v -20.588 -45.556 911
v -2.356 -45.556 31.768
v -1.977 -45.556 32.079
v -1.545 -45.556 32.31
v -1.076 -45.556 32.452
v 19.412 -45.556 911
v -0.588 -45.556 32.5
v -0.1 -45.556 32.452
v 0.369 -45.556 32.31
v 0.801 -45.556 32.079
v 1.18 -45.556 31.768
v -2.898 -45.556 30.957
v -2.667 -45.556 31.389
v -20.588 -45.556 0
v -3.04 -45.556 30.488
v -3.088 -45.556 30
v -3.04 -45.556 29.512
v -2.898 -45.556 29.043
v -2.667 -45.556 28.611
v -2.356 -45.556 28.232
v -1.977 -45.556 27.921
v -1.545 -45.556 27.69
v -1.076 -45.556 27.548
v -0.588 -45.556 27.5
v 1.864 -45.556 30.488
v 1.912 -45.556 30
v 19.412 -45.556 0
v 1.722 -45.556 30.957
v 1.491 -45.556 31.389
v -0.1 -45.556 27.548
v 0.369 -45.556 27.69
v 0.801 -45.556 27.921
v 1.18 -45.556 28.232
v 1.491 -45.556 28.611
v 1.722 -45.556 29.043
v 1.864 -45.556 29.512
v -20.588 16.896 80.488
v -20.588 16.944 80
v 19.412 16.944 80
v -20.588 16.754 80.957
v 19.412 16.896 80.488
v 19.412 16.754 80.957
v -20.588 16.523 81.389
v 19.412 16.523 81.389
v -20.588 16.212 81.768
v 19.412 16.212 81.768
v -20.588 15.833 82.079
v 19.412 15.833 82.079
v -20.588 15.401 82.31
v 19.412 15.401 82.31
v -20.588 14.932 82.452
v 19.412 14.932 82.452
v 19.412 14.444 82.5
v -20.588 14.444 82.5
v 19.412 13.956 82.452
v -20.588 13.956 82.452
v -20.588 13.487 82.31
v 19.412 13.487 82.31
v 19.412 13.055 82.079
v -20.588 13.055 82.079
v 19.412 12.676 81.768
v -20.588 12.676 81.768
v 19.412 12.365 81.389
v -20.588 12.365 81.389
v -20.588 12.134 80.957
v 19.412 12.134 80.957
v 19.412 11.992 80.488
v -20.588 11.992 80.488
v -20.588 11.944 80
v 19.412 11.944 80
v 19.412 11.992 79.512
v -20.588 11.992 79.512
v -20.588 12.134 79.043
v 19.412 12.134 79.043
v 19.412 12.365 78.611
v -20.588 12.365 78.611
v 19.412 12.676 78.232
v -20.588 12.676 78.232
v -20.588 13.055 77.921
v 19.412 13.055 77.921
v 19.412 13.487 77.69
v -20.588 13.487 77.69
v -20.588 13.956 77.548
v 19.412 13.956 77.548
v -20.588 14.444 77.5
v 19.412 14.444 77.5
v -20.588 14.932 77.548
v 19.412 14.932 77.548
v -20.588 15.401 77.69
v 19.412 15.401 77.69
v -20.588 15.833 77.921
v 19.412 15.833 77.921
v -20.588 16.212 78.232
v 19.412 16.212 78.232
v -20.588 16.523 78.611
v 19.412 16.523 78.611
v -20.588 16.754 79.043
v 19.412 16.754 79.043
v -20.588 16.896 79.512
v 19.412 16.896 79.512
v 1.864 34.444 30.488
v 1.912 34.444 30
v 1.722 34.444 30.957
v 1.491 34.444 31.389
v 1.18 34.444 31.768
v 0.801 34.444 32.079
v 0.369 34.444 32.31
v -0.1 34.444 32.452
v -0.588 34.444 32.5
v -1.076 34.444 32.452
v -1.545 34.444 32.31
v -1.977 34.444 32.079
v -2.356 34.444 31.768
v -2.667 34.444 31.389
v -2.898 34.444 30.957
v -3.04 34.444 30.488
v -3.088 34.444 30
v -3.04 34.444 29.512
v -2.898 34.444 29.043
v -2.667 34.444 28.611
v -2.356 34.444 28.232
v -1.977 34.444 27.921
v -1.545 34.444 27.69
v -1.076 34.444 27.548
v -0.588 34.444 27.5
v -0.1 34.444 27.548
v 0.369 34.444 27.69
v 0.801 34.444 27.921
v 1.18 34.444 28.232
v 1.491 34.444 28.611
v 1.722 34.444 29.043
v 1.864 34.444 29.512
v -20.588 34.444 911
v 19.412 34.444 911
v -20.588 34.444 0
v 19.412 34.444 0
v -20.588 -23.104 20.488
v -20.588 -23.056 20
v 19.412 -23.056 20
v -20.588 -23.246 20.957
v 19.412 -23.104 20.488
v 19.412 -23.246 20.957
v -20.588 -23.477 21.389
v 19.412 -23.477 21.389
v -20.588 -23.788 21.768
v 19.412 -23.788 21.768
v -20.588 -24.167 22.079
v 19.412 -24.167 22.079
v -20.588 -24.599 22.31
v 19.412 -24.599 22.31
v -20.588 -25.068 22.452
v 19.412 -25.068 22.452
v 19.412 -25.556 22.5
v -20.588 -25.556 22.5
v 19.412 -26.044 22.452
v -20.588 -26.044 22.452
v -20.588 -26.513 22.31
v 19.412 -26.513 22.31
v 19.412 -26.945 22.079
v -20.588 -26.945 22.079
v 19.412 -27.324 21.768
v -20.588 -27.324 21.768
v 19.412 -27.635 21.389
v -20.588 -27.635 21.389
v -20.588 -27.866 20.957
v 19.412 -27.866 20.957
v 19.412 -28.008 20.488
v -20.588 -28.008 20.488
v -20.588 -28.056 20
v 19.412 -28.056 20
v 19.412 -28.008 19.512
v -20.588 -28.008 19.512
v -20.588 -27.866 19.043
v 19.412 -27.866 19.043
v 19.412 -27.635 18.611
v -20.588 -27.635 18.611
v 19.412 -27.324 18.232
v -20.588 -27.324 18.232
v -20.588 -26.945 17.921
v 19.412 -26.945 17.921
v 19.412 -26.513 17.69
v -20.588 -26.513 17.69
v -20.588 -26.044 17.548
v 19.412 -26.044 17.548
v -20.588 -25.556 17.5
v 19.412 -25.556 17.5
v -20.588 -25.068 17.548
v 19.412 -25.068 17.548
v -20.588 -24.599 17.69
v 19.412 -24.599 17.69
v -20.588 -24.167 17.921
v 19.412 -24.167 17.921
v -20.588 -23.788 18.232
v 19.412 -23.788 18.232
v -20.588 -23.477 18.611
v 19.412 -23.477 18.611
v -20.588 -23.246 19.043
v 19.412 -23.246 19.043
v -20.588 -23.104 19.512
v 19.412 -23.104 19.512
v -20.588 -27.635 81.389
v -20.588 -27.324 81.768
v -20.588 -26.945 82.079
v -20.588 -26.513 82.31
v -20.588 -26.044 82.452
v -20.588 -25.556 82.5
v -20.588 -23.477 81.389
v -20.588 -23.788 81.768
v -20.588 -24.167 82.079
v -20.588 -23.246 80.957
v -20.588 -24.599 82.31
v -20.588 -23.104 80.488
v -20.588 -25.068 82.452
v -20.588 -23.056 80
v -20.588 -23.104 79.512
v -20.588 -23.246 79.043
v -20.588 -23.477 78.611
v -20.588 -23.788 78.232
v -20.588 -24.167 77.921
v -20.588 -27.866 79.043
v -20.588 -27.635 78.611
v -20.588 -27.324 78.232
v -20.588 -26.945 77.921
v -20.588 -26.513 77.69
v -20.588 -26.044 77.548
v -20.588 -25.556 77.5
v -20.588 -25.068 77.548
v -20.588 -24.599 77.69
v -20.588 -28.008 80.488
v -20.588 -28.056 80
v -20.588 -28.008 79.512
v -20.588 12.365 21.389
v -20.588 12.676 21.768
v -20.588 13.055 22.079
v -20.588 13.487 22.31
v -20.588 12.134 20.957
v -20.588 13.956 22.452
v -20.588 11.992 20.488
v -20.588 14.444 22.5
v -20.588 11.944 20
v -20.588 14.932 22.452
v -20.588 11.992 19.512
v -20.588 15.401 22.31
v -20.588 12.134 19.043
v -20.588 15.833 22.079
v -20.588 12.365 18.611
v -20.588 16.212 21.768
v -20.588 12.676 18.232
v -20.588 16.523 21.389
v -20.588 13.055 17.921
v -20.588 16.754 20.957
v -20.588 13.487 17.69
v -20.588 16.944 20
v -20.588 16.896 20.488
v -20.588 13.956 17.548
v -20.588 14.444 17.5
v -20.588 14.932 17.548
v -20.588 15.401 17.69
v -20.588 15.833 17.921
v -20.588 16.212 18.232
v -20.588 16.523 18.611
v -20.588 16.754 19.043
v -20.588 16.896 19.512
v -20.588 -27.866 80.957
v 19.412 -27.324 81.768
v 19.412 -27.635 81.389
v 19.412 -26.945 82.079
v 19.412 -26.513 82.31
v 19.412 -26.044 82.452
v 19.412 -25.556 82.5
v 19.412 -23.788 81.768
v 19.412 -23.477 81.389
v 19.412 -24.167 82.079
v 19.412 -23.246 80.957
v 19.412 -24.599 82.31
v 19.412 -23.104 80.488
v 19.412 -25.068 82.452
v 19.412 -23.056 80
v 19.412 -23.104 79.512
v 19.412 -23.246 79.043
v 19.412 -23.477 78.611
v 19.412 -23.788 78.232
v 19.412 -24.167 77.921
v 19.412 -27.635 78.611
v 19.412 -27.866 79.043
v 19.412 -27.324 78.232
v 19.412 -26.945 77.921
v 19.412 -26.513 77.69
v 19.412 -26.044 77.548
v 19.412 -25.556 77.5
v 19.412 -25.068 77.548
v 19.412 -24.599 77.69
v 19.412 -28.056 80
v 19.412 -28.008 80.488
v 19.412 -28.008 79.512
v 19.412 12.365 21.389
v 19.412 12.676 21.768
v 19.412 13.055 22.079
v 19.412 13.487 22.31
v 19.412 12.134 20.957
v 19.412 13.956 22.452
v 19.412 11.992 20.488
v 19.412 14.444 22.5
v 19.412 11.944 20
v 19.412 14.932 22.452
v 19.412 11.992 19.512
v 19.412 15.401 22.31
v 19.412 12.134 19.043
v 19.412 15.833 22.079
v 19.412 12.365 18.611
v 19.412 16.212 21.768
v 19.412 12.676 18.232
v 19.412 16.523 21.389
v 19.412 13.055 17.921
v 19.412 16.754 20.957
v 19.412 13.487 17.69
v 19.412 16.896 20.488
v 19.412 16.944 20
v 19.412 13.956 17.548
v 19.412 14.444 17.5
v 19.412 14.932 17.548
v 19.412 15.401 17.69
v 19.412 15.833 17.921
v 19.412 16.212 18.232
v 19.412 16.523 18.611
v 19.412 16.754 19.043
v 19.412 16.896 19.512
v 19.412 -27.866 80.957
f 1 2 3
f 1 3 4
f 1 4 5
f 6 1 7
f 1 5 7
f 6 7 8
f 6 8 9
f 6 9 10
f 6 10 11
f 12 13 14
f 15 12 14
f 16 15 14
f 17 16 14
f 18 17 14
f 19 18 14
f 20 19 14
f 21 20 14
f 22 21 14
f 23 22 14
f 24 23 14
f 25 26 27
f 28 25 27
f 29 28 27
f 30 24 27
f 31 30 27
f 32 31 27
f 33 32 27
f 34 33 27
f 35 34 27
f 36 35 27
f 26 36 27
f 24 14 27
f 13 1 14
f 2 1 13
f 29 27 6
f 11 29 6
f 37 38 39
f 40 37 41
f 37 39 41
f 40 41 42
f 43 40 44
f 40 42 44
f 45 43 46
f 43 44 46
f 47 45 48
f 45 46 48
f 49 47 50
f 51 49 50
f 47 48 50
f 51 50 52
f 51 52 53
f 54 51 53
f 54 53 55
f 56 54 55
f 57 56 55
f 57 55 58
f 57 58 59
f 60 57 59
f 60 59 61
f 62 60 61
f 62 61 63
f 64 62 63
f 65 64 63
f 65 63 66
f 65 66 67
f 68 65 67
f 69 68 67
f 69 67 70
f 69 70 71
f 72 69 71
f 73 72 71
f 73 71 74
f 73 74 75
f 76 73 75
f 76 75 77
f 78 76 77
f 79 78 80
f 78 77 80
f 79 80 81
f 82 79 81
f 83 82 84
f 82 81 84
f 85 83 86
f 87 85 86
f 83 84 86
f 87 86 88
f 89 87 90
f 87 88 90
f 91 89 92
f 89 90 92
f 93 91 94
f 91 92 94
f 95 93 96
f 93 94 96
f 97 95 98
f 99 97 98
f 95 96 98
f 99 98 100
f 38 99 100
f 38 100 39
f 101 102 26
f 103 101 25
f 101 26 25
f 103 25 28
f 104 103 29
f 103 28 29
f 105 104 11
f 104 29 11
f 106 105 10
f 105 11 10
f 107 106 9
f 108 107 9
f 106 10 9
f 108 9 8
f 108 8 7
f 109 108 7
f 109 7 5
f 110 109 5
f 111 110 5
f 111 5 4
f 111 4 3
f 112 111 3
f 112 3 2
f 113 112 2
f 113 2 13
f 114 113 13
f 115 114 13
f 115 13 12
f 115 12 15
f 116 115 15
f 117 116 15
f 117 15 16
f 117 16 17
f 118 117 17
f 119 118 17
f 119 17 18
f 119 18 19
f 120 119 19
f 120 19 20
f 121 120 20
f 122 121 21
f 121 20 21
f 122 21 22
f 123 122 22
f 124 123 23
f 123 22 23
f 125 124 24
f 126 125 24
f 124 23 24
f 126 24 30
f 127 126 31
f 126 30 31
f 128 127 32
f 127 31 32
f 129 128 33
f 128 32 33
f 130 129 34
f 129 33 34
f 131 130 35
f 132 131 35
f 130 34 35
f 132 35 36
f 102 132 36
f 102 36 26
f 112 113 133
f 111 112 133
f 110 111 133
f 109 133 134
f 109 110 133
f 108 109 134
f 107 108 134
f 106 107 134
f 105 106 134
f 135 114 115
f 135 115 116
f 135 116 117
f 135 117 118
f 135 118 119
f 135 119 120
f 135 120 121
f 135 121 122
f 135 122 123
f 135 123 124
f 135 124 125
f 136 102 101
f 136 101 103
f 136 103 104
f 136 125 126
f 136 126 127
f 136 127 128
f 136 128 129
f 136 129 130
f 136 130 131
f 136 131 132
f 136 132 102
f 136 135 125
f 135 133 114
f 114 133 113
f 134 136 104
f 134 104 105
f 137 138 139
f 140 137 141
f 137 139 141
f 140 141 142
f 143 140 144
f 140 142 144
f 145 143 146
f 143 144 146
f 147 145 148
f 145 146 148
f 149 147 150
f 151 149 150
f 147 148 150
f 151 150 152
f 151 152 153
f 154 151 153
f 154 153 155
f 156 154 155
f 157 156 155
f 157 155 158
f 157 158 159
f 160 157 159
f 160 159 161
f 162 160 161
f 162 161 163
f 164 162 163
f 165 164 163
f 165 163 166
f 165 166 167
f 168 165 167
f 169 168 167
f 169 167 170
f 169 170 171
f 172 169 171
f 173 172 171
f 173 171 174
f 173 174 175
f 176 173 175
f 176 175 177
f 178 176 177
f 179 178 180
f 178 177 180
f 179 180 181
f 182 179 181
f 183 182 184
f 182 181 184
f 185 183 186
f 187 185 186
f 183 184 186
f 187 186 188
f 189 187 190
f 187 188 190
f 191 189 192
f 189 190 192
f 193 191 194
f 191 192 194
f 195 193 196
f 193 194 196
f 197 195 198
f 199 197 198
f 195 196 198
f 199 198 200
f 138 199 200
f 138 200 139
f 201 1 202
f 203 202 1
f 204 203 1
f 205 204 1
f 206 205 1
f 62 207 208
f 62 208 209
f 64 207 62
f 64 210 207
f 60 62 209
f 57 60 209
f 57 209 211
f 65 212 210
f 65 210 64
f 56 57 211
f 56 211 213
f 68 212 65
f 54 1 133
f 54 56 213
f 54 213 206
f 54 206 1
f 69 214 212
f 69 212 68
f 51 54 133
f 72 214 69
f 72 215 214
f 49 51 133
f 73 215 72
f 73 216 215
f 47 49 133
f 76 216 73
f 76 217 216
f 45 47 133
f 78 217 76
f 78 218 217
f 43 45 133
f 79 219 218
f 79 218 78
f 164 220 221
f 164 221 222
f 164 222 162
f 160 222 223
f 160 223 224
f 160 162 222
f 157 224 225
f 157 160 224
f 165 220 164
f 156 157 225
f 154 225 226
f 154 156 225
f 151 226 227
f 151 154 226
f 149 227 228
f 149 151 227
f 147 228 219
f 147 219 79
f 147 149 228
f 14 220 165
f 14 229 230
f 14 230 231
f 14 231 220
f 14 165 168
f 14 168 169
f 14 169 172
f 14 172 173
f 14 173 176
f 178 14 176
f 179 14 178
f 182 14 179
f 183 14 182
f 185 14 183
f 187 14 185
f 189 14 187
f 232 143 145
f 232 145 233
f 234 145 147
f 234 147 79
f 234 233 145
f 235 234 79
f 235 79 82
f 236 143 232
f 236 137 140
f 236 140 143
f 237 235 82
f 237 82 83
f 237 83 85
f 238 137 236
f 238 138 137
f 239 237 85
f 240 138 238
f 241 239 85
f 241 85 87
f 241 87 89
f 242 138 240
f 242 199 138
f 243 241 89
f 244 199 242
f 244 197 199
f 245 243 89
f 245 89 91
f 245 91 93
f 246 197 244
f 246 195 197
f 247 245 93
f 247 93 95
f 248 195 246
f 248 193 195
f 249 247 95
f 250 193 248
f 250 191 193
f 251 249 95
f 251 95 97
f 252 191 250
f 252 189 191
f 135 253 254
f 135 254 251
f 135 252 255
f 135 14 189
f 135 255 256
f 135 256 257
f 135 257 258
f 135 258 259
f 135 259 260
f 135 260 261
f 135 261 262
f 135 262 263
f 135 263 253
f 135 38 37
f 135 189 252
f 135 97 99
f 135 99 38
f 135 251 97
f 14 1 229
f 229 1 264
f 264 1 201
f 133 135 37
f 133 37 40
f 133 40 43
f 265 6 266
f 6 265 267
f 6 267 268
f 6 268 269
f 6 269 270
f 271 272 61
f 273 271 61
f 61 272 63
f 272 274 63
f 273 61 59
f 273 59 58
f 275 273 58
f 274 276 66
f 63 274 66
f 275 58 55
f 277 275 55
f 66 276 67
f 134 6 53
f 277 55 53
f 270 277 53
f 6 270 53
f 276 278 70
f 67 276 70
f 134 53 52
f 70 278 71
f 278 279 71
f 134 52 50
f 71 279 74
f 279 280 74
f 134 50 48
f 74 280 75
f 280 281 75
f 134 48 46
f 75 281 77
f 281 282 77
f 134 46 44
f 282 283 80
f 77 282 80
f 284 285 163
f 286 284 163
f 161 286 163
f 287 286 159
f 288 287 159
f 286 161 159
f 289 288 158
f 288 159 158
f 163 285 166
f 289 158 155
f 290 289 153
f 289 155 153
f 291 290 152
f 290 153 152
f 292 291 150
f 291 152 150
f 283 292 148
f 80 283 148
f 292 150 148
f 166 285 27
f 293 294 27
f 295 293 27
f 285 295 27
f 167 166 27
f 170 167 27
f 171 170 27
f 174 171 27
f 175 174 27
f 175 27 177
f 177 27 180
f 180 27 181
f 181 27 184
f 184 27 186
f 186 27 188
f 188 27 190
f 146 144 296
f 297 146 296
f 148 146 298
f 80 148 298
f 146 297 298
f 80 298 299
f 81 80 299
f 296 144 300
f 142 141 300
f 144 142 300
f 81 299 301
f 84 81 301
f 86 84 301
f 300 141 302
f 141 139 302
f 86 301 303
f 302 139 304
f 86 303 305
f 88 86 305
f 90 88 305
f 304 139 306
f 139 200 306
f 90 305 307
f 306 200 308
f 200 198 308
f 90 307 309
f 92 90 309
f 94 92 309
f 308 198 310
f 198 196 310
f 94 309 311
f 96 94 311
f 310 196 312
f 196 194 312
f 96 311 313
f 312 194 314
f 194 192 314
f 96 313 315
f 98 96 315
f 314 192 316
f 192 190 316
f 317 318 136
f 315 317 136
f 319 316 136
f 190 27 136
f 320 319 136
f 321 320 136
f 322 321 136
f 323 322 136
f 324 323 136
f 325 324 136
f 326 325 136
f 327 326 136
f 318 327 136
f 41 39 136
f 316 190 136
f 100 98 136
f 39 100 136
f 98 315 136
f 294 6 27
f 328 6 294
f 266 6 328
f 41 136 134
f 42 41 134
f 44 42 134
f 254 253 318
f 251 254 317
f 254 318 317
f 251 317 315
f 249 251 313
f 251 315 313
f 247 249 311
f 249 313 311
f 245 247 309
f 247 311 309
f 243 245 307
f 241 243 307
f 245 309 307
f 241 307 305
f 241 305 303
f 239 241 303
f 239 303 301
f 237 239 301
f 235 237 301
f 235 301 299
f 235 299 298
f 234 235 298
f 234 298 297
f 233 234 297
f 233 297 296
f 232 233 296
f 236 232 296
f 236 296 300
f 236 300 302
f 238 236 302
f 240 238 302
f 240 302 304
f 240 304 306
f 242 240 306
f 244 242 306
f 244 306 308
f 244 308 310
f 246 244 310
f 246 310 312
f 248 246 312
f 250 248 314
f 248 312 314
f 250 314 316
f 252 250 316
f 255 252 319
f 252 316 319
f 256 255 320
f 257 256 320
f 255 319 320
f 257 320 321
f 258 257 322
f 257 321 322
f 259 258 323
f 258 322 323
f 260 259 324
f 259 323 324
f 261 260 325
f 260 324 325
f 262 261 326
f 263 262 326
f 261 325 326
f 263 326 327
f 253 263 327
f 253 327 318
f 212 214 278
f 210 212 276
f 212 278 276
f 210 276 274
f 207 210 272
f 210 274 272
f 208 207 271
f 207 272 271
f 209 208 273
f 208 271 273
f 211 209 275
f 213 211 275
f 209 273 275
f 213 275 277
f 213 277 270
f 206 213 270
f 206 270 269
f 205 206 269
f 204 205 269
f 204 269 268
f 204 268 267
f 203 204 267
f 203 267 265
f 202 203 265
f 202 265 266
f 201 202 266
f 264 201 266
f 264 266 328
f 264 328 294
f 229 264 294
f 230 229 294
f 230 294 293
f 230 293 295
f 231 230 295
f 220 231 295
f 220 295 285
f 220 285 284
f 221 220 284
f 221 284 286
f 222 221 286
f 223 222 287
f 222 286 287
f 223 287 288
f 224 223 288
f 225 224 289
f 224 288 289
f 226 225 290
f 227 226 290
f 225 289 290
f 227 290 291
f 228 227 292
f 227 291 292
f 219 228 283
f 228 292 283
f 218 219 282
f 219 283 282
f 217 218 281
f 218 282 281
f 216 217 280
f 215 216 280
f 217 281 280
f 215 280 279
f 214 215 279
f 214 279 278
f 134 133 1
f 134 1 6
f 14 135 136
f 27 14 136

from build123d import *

# Parameters (mm, degrees)
F0_W     = 40
F0_H     = 80
F1_DEPTH = 911
F2_R     = 2.5
F3_DEPTH = 40.001
F4_R     = 2.5
F5_DEPTH = 80.001


with BuildPart() as f1:
    # F0 (on Top) → F1 (new body)
    with BuildSketch(Plane.XY):
        with Locations((-0.58816, -5.555982)):
            Rectangle(F0_W, F0_H)
    extrude(amount=F1_DEPTH)

    # F2 (on face) → F3 (cut, through all)
    with BuildSketch(Plane.YZ.offset(19.41184)):
        with Locations((-25.555982, 80)):
            Circle(F2_R)
        with Locations((14.444018, 80)):
            Circle(F2_R)
        with Locations((14.444018, 20)):
            Circle(F2_R)
        with Locations((-25.555982, 20)):
            Circle(F2_R)
    extrude(amount=-F3_DEPTH, mode=Mode.SUBTRACT)

    # F4 (on face) → F5 (cut, through all)
    with BuildSketch(Plane.XZ.offset(45.555982)):
        with Locations((-0.58816, 30)):
            Circle(F4_R)
    extrude(amount=-F5_DEPTH, mode=Mode.SUBTRACT)


solid = f1.part
